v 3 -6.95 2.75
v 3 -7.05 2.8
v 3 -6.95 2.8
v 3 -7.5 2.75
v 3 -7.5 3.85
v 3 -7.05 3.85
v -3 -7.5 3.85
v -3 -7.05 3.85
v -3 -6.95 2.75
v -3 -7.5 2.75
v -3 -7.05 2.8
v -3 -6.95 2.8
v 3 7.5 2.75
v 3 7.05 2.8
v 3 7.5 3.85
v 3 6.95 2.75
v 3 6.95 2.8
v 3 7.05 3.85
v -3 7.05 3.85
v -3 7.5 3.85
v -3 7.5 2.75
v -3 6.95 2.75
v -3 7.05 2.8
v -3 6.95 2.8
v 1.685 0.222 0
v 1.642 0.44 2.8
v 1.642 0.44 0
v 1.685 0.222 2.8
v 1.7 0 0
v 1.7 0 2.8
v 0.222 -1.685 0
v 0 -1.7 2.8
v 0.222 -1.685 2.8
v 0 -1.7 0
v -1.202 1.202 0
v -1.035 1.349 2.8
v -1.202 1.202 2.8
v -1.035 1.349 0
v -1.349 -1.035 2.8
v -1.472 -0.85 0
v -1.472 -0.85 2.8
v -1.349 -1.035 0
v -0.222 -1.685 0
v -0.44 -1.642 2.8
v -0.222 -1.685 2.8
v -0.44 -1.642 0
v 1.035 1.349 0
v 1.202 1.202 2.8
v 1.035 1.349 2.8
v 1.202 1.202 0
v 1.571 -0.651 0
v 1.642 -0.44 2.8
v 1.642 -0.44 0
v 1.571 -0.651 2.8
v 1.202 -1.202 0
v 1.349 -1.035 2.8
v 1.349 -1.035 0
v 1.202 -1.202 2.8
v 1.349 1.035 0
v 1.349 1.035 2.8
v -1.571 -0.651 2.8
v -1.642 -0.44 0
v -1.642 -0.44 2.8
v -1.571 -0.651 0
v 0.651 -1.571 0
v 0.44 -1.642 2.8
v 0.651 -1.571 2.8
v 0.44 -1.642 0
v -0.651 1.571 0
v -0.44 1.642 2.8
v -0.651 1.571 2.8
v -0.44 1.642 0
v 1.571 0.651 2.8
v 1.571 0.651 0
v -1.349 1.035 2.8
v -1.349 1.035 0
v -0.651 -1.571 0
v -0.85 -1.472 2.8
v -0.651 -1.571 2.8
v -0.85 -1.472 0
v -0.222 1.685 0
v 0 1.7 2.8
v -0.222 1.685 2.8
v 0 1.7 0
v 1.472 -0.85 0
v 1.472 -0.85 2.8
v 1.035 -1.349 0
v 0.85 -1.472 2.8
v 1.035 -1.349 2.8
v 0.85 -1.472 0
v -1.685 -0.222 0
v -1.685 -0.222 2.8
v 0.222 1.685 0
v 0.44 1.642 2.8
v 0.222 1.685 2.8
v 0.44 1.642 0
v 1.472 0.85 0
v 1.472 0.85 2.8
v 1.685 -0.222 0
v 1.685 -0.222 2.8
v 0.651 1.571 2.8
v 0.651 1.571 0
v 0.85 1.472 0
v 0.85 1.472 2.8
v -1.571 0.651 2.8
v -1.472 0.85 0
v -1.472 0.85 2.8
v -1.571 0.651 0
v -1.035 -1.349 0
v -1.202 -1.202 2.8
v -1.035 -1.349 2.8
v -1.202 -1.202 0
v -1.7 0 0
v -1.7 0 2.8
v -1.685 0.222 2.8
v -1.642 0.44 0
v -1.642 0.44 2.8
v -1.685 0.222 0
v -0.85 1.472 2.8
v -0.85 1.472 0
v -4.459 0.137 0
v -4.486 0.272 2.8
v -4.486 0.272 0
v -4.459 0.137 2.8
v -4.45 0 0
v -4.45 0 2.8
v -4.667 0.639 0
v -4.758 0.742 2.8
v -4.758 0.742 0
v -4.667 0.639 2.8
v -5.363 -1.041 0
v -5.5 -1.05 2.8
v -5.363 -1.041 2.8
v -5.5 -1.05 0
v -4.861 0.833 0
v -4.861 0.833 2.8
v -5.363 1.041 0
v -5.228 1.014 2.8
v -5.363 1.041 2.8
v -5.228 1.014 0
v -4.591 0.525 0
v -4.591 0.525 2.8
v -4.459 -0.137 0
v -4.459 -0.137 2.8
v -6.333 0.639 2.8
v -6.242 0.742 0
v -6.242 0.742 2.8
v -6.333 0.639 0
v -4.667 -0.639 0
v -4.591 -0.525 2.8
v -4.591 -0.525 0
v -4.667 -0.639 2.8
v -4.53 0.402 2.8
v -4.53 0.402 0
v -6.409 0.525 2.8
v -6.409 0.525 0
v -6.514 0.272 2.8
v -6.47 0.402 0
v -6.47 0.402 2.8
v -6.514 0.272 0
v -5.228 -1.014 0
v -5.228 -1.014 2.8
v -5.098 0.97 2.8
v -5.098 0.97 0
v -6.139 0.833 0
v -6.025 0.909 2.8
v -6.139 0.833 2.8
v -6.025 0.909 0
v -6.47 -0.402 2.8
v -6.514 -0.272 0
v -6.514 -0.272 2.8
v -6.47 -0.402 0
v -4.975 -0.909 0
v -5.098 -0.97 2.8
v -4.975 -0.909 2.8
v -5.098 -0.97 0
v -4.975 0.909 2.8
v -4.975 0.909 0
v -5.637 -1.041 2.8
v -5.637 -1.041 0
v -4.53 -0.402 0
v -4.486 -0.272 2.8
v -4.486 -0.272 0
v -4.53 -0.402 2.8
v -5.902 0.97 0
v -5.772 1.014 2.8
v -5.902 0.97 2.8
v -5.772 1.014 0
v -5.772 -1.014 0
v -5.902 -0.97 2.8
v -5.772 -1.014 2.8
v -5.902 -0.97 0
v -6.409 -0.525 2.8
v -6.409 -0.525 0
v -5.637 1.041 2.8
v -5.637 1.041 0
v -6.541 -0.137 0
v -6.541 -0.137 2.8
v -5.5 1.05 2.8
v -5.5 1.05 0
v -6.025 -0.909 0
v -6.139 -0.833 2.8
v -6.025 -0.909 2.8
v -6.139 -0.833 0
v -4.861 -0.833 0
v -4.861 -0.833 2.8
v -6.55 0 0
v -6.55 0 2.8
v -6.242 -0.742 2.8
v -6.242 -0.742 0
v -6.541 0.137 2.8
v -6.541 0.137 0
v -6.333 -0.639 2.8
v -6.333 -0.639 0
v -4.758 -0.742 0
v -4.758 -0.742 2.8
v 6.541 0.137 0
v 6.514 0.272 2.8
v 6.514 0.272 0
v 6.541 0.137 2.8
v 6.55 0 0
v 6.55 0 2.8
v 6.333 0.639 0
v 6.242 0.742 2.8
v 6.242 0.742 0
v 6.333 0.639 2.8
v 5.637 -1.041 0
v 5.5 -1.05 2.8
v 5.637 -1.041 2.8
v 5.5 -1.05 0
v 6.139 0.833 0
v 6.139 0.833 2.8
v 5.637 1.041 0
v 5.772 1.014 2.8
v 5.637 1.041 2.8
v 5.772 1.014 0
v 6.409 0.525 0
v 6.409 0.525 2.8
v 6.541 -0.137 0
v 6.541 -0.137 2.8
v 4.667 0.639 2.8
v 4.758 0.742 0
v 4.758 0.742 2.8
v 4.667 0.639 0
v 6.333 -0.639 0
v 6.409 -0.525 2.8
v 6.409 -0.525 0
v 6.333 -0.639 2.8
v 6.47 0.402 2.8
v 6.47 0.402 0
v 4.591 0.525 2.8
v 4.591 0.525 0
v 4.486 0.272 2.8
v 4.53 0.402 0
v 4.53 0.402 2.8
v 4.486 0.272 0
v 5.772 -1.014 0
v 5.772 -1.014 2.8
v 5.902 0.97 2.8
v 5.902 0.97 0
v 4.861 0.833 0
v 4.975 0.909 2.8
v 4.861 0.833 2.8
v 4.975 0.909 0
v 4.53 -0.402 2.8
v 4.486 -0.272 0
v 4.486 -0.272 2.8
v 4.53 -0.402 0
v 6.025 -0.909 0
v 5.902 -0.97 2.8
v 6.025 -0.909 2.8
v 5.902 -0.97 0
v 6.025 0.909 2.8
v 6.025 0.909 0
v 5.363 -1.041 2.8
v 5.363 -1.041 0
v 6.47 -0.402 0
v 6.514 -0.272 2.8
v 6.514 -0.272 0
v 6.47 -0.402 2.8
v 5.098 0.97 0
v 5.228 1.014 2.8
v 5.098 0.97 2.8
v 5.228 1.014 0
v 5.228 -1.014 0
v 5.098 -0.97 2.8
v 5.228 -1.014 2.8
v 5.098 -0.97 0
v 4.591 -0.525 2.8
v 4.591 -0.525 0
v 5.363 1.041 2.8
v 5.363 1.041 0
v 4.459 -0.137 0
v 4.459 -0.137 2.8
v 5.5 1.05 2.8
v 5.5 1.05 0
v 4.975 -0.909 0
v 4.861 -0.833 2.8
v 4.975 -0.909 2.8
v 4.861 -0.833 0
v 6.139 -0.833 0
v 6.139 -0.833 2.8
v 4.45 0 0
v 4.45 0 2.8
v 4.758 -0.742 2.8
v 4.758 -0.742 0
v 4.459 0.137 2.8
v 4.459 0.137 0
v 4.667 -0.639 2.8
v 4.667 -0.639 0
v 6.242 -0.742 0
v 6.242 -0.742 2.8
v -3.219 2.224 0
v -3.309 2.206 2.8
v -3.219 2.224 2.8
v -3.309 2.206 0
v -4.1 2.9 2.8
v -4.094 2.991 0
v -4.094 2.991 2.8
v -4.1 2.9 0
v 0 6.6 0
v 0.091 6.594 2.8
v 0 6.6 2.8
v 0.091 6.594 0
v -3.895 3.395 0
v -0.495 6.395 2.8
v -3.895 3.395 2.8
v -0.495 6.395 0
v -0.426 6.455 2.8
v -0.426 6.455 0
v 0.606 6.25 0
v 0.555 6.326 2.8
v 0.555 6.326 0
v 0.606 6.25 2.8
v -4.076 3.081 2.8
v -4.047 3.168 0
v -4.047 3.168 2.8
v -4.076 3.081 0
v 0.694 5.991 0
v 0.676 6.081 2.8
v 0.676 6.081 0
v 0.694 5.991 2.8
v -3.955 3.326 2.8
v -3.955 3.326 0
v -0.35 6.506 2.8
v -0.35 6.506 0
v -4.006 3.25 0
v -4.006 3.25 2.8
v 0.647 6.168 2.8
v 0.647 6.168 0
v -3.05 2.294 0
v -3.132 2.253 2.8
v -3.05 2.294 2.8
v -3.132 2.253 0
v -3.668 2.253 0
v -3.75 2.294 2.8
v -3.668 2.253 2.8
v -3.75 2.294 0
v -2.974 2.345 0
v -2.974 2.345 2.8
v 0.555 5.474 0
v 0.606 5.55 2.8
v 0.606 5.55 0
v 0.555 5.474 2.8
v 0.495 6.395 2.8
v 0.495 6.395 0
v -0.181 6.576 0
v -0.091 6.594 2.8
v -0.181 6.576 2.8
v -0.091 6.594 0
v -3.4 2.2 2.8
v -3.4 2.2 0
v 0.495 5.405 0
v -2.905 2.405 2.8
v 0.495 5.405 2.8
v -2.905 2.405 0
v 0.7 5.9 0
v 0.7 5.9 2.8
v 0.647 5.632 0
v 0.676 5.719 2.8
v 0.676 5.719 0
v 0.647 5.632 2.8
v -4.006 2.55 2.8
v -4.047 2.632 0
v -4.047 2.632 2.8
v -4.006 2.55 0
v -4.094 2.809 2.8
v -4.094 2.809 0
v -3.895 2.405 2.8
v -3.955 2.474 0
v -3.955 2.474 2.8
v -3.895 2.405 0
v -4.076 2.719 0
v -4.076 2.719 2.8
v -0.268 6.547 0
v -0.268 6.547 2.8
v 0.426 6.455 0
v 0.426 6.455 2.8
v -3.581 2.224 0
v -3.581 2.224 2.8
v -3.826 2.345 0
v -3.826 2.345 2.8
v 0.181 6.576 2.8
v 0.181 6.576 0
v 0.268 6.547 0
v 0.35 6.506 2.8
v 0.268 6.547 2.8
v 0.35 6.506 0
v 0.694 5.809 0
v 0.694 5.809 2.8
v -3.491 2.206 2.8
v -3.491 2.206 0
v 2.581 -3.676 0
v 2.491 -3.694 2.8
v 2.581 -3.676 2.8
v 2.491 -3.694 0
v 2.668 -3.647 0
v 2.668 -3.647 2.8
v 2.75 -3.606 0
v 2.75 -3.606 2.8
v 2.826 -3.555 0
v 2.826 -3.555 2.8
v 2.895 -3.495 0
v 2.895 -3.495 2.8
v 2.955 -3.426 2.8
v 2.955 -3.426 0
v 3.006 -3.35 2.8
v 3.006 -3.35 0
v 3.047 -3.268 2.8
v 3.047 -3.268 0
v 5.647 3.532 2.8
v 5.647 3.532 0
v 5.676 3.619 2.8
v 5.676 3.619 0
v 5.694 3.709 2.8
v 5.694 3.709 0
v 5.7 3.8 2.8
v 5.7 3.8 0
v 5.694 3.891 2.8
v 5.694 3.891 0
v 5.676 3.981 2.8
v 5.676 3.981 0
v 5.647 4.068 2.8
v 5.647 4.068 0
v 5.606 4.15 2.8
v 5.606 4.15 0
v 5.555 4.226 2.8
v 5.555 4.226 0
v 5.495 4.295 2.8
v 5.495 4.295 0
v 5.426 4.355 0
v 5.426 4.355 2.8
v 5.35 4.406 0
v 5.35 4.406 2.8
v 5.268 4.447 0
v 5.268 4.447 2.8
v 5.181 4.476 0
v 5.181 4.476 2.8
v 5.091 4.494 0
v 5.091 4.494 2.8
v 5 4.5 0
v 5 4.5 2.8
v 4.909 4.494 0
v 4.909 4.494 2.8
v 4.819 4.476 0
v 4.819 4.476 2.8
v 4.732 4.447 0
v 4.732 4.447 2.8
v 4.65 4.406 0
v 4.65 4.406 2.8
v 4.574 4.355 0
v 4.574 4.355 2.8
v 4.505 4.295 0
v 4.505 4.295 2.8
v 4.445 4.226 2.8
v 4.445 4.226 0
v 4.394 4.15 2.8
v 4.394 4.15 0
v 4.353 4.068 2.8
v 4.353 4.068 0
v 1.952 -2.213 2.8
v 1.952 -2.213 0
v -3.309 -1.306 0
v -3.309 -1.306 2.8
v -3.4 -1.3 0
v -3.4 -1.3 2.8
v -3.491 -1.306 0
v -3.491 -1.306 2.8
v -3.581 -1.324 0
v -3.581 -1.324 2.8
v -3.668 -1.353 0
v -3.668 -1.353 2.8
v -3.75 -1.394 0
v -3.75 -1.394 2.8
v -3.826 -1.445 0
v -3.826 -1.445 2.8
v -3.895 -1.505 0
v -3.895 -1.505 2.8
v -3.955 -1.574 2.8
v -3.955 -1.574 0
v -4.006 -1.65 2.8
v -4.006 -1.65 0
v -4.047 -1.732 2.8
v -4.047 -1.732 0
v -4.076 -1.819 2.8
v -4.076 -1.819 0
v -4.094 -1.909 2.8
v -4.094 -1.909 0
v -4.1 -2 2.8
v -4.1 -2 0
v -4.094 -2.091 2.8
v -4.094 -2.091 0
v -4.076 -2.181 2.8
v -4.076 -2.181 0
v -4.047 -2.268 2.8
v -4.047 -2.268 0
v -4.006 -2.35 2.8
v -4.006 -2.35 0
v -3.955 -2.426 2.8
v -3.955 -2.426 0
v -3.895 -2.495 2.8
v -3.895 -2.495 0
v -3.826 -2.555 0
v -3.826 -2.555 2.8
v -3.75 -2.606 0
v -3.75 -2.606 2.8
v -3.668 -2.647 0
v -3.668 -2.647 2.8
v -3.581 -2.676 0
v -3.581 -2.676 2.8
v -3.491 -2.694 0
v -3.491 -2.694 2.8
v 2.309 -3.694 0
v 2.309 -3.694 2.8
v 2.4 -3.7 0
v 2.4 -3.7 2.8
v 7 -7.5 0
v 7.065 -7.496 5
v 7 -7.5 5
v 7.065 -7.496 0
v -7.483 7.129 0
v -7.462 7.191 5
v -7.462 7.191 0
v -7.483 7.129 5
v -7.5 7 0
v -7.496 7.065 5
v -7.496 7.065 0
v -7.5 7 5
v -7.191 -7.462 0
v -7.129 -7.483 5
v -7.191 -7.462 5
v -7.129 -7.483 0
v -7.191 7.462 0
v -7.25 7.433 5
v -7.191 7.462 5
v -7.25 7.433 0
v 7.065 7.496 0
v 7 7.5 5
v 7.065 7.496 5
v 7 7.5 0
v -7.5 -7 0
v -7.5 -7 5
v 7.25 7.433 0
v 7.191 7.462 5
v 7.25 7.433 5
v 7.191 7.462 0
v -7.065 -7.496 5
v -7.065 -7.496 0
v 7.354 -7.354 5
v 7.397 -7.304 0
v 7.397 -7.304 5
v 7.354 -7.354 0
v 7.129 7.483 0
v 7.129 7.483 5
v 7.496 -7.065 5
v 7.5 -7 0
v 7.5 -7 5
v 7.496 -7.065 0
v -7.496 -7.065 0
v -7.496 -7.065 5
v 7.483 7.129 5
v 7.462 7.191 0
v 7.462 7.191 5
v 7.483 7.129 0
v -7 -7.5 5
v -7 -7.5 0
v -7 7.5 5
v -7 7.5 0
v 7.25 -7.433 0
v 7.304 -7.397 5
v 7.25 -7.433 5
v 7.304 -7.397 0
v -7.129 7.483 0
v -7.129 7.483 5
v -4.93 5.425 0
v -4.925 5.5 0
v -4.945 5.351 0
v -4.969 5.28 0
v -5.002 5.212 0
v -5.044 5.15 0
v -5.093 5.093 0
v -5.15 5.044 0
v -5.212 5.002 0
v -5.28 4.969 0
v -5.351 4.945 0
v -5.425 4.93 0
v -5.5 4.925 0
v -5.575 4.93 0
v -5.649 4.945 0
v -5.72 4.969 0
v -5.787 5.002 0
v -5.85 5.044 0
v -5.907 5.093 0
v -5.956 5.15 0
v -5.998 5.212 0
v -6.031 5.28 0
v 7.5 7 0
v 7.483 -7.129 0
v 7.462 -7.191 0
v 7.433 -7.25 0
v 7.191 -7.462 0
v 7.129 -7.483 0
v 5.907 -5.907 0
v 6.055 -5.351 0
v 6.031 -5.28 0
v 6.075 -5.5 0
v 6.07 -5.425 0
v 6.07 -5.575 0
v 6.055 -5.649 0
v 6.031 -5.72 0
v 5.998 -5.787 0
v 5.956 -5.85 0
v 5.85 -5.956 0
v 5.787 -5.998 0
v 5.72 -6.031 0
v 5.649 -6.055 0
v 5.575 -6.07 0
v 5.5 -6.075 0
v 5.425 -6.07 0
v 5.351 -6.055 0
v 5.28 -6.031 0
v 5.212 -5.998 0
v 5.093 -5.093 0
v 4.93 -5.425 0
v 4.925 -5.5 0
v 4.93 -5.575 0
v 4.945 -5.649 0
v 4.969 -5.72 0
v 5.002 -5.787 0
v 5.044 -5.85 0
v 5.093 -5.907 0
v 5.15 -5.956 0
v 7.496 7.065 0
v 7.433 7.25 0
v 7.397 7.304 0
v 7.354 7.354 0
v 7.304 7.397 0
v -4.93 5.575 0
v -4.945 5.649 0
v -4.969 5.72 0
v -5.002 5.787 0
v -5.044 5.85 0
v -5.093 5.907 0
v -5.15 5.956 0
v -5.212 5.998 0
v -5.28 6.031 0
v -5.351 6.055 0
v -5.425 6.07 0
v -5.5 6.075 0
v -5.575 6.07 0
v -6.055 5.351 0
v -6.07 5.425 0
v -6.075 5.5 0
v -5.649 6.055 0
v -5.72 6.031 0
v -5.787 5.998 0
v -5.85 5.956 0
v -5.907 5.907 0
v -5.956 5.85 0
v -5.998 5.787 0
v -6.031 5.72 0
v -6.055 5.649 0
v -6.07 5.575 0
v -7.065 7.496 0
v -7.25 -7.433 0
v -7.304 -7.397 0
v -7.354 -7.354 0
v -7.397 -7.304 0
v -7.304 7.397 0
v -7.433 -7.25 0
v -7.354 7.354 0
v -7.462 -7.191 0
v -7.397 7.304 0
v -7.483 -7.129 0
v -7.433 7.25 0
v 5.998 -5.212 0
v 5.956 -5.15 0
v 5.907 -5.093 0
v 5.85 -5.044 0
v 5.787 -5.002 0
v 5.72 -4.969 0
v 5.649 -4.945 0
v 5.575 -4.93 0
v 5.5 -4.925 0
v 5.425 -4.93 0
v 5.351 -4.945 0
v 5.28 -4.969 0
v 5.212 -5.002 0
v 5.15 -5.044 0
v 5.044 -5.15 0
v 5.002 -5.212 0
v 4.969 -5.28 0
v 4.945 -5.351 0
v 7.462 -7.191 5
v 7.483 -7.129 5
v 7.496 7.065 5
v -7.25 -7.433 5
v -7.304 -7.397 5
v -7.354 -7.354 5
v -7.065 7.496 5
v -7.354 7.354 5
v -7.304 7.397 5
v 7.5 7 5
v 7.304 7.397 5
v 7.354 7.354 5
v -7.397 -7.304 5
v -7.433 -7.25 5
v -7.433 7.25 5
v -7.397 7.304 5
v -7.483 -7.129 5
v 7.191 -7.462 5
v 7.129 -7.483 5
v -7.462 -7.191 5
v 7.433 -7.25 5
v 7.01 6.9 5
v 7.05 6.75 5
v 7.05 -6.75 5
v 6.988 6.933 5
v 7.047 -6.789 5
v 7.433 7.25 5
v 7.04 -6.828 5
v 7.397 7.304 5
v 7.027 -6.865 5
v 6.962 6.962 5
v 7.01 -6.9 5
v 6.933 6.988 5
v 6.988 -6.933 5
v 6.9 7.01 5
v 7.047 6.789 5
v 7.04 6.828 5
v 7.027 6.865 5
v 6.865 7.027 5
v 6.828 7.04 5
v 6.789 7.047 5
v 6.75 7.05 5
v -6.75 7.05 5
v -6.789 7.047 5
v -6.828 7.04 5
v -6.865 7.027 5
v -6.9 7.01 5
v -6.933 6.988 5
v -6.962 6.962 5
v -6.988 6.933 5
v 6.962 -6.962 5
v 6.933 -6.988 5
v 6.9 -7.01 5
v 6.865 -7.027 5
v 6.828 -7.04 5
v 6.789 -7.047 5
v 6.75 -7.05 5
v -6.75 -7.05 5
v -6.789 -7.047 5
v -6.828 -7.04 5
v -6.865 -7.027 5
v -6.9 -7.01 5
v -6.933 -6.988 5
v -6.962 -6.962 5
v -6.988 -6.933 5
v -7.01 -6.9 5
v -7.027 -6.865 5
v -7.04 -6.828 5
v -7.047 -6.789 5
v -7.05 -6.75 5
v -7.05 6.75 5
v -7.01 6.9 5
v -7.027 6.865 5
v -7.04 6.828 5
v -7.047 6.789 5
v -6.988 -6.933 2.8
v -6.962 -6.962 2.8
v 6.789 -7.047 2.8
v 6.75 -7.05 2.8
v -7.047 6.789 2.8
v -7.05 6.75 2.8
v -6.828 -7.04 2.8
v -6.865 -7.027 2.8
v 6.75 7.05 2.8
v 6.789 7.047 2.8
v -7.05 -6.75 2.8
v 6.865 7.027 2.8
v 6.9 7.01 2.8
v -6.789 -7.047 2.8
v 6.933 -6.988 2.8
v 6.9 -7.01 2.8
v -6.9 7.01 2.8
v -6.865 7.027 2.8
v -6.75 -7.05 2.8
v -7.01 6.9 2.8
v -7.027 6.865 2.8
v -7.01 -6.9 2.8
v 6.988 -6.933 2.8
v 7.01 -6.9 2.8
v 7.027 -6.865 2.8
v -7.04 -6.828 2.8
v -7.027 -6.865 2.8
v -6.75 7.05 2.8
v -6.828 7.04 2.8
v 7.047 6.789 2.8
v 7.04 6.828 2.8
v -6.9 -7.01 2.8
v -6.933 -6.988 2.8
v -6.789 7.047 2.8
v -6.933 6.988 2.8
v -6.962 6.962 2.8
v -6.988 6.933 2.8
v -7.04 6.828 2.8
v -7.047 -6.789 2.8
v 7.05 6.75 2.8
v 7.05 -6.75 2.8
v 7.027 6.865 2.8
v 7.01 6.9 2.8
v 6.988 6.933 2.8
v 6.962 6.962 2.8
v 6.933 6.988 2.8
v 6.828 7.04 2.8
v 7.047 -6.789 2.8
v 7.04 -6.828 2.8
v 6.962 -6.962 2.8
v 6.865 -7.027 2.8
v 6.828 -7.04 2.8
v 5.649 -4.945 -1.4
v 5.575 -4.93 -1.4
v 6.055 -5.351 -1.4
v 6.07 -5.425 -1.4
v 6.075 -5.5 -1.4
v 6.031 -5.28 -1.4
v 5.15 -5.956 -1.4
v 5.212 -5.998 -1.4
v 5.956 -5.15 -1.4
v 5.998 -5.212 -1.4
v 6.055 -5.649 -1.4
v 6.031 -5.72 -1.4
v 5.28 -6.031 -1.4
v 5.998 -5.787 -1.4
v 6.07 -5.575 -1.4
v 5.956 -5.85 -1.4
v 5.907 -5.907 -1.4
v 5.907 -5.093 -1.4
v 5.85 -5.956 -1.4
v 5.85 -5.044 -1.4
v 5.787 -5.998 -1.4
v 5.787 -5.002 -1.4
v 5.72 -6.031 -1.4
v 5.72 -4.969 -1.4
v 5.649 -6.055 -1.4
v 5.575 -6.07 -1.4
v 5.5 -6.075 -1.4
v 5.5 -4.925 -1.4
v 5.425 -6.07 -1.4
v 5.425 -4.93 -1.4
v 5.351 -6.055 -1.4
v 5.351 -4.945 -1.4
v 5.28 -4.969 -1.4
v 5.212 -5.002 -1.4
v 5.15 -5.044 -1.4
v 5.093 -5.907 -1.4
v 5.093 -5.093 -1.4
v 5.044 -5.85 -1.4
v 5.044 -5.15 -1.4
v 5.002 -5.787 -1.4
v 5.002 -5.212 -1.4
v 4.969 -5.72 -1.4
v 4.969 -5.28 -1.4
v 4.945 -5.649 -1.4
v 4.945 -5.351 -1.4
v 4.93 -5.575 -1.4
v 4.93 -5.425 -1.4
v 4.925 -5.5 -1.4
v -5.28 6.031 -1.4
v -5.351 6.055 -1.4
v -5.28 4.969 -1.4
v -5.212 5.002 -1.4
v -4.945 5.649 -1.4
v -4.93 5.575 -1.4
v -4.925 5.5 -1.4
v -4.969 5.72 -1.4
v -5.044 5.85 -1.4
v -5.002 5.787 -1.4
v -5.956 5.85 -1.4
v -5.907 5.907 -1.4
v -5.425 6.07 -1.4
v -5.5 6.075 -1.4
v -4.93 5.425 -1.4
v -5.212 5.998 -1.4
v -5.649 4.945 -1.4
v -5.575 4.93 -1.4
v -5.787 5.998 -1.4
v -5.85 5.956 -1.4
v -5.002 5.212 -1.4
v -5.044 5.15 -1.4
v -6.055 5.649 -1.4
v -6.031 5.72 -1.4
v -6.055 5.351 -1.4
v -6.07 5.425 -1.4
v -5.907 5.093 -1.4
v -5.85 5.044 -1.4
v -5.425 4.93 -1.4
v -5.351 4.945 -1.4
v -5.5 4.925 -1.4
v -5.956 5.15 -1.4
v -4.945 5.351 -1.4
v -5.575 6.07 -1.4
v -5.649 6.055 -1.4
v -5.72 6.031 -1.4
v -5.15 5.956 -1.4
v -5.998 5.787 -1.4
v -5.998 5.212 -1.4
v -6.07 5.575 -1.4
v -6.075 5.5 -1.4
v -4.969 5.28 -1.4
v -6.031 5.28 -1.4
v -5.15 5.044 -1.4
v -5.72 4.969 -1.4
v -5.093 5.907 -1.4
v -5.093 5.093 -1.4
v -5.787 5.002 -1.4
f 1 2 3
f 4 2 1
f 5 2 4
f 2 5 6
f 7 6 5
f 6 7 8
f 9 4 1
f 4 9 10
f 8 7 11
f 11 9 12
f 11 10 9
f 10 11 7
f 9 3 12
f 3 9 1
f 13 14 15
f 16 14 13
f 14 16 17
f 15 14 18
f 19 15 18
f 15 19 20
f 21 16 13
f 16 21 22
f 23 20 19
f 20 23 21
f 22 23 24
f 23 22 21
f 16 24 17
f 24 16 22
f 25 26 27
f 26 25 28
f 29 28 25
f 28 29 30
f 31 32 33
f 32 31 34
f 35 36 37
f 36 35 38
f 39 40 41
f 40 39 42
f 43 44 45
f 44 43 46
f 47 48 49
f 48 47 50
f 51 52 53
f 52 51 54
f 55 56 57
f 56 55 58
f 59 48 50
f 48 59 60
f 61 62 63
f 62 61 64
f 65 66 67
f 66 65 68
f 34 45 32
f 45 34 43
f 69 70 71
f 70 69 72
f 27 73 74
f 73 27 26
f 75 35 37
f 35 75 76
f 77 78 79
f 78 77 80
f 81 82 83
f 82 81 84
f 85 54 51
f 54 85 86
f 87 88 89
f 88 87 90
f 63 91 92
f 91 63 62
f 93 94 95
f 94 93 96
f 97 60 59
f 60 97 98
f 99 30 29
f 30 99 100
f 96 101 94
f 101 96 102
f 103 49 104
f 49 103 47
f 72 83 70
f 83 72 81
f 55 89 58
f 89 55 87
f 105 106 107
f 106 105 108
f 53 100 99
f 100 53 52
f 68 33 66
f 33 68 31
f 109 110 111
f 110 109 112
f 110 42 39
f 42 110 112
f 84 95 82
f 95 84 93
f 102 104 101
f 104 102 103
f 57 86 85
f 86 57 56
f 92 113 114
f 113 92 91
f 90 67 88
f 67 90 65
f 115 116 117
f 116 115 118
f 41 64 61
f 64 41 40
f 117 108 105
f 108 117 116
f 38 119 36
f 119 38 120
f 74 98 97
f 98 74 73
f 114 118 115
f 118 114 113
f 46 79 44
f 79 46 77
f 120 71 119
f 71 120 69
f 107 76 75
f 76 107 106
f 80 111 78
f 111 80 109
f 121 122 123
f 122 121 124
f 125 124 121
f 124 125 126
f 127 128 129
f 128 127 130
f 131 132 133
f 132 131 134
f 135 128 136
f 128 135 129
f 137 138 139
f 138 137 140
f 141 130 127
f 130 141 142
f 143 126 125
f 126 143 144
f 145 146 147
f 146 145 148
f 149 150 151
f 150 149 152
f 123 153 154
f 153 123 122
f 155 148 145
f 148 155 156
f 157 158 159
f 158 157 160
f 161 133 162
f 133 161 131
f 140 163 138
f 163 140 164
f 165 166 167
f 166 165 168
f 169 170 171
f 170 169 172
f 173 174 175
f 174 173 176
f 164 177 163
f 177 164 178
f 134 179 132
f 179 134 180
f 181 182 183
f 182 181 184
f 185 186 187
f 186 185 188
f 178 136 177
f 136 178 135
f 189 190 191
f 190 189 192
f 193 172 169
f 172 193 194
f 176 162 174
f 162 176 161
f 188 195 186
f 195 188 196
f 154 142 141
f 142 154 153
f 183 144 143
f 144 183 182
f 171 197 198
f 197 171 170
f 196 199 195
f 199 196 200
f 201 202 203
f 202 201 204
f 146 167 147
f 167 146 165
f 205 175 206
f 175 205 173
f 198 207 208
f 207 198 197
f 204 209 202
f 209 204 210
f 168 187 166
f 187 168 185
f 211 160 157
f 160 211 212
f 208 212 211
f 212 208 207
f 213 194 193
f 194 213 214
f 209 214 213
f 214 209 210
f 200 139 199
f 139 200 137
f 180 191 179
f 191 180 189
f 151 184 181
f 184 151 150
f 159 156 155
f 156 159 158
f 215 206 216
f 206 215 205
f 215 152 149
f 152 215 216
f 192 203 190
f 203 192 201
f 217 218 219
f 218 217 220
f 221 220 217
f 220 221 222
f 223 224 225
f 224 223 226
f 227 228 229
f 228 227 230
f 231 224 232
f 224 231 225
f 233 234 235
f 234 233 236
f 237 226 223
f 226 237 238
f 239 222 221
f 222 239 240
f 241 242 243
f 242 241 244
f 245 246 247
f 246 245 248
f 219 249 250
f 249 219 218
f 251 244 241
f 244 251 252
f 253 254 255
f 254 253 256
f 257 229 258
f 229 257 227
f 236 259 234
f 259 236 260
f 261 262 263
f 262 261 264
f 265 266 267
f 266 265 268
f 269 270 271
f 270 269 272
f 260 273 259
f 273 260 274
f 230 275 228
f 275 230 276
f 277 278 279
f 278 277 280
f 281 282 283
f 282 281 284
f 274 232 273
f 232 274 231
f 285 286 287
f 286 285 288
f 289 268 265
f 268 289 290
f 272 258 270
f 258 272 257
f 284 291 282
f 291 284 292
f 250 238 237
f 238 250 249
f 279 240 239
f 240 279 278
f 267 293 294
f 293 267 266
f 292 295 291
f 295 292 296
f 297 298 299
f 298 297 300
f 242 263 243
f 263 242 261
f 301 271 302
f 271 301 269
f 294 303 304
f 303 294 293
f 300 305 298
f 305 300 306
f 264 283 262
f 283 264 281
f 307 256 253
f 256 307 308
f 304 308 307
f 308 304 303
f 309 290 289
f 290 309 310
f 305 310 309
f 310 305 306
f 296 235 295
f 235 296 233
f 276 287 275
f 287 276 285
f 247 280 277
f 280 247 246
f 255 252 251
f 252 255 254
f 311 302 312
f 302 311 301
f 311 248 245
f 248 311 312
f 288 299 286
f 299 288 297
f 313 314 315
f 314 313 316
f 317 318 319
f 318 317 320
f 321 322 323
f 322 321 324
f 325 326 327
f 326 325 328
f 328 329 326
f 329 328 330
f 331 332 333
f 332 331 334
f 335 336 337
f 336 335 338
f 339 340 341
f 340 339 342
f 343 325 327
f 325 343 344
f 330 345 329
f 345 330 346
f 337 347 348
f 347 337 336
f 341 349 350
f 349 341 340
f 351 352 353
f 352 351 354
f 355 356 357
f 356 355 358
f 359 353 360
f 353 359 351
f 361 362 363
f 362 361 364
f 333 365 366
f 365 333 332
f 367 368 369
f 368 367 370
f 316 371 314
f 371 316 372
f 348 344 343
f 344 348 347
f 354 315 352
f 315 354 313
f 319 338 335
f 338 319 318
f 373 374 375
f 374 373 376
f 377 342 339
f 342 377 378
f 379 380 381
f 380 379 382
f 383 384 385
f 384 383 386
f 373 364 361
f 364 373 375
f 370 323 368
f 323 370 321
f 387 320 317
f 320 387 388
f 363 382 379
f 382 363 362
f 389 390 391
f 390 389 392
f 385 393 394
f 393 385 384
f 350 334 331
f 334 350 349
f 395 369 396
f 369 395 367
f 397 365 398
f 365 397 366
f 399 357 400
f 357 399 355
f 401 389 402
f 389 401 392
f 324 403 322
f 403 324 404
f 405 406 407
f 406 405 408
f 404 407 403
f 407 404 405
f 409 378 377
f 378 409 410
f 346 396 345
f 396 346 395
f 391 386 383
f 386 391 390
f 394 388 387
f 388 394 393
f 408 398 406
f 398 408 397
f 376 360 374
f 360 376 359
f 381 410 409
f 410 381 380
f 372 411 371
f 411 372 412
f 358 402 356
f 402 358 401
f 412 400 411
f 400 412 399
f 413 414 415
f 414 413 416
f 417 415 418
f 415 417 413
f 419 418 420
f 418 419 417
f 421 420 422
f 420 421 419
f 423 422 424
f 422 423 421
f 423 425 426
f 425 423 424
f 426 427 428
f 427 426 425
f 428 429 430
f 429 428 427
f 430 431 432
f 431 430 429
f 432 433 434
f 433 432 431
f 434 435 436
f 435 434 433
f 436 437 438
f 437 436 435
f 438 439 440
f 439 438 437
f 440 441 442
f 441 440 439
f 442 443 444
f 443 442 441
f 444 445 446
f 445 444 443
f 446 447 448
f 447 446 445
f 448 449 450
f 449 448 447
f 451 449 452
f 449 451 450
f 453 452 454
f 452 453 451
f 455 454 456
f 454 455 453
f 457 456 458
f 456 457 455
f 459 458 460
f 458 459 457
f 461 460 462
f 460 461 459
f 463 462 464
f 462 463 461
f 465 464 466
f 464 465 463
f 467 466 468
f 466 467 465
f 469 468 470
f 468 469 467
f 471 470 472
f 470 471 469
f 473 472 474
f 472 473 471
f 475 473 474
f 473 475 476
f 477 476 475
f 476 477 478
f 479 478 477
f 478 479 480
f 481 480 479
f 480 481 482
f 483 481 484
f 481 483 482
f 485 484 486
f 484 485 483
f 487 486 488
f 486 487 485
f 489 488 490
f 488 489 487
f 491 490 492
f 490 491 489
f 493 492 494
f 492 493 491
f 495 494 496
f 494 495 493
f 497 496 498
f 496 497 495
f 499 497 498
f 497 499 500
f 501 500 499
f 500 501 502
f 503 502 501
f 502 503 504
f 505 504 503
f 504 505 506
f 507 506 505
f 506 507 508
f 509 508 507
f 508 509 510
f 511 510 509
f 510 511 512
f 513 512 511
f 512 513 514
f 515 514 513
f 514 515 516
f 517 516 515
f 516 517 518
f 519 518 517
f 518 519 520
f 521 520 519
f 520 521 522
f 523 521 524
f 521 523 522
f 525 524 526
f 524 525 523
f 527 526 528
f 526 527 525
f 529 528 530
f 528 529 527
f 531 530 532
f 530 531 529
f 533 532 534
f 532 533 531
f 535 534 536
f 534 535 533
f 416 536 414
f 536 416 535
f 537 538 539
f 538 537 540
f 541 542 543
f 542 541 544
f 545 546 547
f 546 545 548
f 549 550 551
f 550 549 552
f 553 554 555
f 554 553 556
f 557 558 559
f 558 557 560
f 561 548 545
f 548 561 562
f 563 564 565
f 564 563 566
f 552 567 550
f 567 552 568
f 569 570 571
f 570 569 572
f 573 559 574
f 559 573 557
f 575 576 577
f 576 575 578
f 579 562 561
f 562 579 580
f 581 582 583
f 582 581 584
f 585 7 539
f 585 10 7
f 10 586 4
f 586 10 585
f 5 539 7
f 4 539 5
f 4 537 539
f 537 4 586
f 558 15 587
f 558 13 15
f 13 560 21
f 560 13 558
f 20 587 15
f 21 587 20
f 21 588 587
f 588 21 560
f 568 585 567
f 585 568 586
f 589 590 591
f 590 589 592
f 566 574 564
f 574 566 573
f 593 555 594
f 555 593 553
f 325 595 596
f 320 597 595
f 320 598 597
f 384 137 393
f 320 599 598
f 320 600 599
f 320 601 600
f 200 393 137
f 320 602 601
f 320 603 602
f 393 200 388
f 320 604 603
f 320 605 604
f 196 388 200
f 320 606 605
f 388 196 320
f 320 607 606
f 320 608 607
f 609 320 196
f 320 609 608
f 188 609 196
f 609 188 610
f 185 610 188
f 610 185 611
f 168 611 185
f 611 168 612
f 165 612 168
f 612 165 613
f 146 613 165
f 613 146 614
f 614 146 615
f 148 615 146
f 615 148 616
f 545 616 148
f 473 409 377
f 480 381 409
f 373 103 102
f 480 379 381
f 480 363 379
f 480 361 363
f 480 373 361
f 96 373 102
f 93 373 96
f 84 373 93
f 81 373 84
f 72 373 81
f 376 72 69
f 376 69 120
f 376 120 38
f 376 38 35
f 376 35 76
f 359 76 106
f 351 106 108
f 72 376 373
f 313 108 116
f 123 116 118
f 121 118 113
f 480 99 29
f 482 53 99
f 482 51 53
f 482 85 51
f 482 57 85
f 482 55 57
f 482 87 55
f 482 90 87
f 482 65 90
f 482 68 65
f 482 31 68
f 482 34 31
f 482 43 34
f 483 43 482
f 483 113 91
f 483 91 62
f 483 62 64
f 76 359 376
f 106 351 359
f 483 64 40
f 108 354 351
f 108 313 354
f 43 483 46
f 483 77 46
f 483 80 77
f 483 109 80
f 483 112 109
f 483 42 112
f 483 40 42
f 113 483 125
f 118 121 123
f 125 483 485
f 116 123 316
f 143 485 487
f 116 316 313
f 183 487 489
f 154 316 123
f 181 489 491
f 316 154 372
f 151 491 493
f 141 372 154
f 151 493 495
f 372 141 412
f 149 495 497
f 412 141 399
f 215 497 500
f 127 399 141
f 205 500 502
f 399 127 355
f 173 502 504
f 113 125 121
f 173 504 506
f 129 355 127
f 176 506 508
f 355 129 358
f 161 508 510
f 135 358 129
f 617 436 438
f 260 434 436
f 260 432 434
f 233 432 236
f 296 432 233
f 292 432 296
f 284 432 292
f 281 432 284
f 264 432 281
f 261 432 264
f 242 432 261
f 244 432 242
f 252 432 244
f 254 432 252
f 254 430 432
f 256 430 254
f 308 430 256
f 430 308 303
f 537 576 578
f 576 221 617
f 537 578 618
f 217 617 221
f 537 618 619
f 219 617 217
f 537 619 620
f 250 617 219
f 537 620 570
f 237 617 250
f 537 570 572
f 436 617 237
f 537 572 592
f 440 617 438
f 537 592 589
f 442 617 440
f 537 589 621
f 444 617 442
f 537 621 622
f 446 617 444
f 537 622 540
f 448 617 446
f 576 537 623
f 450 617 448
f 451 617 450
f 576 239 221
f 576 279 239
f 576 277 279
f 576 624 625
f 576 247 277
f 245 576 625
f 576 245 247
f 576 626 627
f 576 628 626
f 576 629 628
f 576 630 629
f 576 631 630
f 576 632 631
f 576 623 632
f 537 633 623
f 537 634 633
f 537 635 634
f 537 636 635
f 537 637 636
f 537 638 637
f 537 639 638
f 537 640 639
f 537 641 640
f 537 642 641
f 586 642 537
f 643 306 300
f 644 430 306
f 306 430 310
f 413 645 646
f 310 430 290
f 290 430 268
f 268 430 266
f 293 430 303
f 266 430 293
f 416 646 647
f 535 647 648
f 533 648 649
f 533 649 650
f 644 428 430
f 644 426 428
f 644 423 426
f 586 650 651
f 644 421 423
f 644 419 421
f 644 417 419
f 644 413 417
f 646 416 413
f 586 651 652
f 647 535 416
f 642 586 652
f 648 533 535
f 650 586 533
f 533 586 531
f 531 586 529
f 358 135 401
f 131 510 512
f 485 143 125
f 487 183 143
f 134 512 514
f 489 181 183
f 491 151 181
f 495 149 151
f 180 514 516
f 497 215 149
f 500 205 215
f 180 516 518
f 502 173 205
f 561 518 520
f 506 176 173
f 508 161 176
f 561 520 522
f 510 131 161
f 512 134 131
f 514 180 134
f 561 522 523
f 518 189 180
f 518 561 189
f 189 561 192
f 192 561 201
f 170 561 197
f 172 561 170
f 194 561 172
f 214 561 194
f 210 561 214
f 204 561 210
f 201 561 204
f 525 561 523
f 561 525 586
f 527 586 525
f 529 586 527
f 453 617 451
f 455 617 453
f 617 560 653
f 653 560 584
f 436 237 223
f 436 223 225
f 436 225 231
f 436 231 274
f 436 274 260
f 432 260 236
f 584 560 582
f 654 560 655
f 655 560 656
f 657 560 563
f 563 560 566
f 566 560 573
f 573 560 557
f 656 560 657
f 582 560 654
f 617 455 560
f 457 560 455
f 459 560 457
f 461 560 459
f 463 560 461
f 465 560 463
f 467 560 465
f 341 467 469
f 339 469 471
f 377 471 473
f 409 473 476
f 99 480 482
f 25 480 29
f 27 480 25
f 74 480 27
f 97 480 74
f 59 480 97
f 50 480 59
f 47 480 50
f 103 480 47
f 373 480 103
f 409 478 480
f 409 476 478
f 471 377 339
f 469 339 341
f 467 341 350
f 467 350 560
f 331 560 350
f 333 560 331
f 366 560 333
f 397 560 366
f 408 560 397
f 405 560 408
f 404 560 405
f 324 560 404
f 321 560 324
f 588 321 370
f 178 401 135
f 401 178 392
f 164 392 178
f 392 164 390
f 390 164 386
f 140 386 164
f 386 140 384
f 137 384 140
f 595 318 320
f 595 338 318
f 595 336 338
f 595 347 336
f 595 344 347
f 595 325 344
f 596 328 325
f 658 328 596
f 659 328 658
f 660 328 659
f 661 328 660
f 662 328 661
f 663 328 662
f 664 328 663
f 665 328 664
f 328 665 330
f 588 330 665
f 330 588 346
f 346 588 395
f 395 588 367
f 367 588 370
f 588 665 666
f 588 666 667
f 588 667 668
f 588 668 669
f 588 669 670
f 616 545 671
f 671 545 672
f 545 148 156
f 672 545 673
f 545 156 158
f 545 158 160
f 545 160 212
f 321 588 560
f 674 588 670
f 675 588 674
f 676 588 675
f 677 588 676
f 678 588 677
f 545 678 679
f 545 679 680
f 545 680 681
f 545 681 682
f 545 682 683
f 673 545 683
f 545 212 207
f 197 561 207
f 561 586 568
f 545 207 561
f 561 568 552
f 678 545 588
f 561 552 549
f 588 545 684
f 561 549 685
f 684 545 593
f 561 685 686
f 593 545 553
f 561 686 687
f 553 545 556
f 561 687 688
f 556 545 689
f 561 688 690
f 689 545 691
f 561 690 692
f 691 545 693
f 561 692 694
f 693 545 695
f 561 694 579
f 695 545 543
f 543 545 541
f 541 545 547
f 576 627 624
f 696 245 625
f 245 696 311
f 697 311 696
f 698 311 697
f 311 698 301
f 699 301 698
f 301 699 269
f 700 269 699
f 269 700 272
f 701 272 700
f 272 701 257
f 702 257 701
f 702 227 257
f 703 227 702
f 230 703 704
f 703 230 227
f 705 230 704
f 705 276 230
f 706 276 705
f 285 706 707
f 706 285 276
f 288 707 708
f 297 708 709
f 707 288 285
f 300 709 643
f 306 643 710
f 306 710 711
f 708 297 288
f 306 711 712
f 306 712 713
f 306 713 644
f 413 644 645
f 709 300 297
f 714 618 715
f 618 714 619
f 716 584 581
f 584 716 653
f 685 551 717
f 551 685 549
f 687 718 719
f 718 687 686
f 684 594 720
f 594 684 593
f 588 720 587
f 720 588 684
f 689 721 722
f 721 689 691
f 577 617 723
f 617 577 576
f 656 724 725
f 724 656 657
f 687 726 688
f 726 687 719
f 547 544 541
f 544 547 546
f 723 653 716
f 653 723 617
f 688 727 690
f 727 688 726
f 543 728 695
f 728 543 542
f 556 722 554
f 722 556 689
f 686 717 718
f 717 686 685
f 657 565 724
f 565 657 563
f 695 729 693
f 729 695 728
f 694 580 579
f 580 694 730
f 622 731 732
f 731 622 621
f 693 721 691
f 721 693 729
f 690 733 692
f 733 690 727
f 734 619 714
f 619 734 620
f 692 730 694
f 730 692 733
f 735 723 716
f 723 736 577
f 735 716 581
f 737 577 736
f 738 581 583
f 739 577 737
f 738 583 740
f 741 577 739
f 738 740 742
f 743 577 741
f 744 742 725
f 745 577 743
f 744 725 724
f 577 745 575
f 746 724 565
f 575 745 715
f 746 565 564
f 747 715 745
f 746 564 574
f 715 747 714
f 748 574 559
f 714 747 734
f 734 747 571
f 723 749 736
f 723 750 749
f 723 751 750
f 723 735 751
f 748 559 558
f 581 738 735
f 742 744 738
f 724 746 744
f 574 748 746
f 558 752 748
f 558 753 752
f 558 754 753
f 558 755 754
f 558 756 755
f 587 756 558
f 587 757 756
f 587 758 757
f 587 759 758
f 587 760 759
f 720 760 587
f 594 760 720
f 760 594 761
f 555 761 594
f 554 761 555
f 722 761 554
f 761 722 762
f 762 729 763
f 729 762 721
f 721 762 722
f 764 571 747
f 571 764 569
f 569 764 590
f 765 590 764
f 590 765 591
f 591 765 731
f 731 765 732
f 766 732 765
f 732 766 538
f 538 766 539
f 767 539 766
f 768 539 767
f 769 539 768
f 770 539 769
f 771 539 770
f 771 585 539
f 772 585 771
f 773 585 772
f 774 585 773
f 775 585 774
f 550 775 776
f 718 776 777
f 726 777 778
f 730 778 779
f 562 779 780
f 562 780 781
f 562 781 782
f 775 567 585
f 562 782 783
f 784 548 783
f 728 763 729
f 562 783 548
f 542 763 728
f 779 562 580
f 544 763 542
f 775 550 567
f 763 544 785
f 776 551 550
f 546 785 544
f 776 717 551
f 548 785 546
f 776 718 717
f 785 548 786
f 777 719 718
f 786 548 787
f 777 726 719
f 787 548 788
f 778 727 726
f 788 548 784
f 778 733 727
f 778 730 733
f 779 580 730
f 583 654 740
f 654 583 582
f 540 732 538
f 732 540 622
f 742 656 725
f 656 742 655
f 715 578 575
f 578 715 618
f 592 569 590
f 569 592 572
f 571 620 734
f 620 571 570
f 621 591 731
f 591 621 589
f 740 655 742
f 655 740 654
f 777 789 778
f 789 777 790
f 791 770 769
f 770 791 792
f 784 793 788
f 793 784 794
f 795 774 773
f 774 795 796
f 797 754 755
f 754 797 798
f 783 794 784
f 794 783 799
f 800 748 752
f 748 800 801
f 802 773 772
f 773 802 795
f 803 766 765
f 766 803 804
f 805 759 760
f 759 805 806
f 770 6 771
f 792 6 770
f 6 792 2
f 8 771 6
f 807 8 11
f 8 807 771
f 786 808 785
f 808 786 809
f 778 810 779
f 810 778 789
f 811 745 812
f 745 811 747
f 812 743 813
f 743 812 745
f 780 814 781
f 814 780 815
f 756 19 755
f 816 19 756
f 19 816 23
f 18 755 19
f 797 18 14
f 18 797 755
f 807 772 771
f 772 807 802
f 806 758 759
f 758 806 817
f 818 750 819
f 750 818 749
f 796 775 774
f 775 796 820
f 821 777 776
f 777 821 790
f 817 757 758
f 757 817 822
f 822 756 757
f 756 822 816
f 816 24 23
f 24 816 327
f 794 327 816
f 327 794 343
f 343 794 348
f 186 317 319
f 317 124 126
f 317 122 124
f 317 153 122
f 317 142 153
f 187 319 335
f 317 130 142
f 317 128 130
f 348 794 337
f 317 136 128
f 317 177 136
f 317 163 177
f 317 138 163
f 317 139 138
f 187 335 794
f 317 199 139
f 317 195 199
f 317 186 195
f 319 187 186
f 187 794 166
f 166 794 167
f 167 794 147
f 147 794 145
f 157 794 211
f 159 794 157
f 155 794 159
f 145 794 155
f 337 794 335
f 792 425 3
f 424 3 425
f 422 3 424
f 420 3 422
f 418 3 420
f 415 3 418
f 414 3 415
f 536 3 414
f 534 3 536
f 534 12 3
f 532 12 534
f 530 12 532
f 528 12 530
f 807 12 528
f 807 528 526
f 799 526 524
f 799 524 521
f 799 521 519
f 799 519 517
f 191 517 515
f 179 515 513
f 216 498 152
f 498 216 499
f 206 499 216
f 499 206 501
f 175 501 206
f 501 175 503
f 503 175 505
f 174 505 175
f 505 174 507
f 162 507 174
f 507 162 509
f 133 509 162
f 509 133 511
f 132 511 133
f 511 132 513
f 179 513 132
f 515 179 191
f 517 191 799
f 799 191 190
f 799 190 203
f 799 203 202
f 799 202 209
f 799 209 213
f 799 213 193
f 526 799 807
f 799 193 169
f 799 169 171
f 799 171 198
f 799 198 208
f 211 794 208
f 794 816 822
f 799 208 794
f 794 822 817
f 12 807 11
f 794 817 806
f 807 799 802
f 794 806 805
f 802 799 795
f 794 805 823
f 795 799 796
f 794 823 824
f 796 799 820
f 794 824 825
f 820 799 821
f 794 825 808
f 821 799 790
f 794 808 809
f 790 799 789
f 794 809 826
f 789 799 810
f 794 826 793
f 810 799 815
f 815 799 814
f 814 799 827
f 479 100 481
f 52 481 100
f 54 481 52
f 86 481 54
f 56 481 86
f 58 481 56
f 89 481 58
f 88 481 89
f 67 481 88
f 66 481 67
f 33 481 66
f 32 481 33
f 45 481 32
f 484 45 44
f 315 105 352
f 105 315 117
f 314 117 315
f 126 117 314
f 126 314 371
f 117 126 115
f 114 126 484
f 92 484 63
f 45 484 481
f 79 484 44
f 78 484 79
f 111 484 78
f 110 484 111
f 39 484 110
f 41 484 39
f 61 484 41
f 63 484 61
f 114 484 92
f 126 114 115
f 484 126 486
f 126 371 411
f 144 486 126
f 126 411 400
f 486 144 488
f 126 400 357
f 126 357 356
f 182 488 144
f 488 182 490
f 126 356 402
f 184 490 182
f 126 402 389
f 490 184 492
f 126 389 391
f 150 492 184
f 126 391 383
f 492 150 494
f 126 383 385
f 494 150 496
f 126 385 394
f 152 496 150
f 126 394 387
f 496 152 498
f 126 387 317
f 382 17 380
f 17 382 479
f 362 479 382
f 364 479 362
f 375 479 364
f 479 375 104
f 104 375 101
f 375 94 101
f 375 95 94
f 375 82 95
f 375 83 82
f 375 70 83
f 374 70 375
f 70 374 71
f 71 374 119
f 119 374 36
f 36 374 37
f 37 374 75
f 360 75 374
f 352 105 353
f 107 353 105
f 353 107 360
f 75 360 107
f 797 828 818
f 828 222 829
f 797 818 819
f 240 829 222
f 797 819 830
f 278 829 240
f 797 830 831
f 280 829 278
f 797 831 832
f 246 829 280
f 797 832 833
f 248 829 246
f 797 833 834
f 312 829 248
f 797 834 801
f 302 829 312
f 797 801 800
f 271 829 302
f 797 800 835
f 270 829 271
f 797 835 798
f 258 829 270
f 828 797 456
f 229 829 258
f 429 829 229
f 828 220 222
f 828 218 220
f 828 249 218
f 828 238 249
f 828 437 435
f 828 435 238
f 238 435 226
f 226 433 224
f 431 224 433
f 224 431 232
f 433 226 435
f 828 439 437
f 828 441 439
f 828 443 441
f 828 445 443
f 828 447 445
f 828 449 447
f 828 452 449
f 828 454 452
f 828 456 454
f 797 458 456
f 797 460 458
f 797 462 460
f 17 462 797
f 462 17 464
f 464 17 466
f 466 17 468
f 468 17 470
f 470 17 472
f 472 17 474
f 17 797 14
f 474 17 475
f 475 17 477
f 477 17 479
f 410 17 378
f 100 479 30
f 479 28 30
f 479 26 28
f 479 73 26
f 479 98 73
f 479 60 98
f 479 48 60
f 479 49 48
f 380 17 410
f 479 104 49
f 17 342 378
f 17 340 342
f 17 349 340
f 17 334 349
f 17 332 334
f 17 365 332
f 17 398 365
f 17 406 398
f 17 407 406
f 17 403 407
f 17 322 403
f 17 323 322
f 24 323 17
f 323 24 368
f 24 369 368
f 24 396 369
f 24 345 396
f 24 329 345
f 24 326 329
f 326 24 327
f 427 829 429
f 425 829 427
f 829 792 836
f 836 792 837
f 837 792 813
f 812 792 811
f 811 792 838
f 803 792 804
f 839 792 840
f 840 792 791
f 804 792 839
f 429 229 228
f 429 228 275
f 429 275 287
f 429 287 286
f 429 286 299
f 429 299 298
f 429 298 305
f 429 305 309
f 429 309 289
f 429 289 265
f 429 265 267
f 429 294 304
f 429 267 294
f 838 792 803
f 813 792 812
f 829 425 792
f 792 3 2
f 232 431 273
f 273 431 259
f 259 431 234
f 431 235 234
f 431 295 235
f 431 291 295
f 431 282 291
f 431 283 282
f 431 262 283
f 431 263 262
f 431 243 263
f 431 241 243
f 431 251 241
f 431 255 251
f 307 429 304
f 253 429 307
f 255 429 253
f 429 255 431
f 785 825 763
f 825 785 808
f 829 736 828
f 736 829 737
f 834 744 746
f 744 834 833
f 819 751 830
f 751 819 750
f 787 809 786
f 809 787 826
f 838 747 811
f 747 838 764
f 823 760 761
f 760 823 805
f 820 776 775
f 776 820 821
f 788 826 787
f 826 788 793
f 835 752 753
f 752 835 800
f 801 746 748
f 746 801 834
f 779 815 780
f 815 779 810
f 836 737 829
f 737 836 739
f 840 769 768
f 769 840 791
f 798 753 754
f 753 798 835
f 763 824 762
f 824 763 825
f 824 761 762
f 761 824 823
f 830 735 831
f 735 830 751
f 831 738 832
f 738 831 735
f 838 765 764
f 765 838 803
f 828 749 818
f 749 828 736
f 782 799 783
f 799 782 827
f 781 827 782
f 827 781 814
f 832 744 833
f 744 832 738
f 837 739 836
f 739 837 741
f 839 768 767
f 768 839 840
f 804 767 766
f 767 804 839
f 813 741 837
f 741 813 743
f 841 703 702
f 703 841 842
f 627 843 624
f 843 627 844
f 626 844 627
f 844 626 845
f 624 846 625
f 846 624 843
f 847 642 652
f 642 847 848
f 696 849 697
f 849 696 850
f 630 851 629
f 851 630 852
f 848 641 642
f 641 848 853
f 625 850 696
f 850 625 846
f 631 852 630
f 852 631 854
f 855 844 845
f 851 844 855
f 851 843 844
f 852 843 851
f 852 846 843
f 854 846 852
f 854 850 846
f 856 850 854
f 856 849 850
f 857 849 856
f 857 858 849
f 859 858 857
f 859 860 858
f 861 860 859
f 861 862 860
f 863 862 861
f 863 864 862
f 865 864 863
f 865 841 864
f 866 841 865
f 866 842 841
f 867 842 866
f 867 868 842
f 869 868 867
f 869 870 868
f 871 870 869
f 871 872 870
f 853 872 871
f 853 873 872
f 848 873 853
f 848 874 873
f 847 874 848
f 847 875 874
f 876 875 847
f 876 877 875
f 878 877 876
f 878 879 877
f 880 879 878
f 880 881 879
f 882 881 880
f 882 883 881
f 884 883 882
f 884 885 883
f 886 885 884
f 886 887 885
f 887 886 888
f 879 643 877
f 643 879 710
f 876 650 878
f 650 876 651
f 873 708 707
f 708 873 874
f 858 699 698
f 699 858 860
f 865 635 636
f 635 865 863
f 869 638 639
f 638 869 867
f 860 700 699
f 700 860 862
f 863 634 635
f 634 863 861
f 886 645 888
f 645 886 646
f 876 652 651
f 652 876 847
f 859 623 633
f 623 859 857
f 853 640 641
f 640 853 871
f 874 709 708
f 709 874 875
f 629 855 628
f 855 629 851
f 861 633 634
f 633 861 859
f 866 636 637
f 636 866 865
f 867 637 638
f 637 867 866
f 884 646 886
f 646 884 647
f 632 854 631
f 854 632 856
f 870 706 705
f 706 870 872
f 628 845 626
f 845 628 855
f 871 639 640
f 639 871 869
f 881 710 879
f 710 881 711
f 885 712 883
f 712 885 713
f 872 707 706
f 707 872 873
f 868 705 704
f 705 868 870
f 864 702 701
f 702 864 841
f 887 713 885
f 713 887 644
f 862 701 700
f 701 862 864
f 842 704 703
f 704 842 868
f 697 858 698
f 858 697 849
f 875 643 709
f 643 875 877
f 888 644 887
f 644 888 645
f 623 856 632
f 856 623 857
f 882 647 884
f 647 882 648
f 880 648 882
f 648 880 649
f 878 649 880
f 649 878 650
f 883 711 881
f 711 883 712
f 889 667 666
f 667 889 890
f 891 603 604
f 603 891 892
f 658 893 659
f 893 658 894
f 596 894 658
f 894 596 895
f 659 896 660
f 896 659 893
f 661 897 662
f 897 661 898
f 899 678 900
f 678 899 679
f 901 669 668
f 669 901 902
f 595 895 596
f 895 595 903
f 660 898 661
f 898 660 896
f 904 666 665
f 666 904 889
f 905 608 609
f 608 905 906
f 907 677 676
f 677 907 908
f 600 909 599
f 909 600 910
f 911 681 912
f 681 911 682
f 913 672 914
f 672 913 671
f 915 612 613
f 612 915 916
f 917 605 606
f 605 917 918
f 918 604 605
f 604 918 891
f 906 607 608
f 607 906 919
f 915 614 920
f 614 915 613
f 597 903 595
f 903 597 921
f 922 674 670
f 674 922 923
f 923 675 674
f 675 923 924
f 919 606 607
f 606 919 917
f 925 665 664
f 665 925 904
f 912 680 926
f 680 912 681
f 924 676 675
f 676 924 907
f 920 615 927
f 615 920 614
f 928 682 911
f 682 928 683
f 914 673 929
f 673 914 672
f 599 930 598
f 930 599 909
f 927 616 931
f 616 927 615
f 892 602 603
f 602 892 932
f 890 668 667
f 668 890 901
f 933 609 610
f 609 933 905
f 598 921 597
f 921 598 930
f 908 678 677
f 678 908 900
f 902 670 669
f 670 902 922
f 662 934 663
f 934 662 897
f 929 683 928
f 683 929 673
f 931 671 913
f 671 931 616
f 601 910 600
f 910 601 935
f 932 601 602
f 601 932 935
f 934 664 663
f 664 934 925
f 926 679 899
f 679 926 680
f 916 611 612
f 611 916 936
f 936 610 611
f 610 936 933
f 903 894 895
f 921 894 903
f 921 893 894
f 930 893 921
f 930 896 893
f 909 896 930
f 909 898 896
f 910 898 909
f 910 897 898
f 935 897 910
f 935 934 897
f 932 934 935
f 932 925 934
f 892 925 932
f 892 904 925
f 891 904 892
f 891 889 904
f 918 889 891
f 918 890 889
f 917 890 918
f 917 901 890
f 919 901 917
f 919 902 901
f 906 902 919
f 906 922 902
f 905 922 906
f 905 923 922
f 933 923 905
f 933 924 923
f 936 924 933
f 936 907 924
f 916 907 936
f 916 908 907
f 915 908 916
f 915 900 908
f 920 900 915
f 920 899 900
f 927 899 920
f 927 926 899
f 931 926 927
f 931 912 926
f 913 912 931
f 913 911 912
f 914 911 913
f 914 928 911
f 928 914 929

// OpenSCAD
// ============================================================================
// PG1350 -> PG1425 Switch Adapter (Rectangular Block Design, v3)
//
// CONCEPT:
//   A rectangular block, like a tiny "adapter PCB" with a bezel:
//     * TOP SIDE : recessed POCKET that the PG1350 (Kailh Choc) bottom
//                  housing drops INTO. Pocket floor has the TRUE Choc
//                  footprint: center post, 2 plastic locating posts,
//                  and 2 electrical pins.
//     * BOTTOM SIDE: - SQUARE center alignment post fitting the PG1425
//                      PCB's square center hole (primary alignment)
//                    - round pin posts matching the PG1425 PCB hole pattern
//                    - two routing channels for the dual-ended stamped
//                      contacts (Choc pin exits -> PG1425 pad positions)
//
// Z REFERENCE: z = 0 is the BOTTOM face of the block (sits on PG1425 PCB).
//   Posts extend below z = 0 into the PCB holes.
//
// KAILH CHOC PG1350 TRUE BOTTOM LAYOUT (viewed from above, switch north up):
//     center post  phi 3.2  at ( 0.0,  0.0 )
//     locating post phi 1.9 at (-5.5,  0.0 ) and ( 5.5, 0.0 )
//     electrical pin phi~1.0 at ( 0.0,  5.9 ) and ( 5.0, 3.8 )
//     bottom housing 13.8 x 13.8, height 2.2 below the 15x15 flange
// ============================================================================

// ---------------------------------------------------------------------------
// PRINT / TOLERANCE SETTINGS
// ---------------------------------------------------------------------------
$fn = 48;                      // Curve smoothness

pocket_clearance = 0.30;       // mm - added to pocket size (Choc body drop-in fit)
hole_clearance   = 0.20;       // mm - added to hole diameters (switch post/pin fit)
post_clearance   = 0.15;       // mm - subtracted from post sizes (PCB hole fit)
eps              = 0.10;       // mm - overlap fudge for clean booleans

// ---------------------------------------------------------------------------
// PG1350 (Kailh Choc) TRUE DIMENSIONS - TOP-SIDE INTERFACE
// ---------------------------------------------------------------------------
choc_body_xy         = 13.80;  // mm - Choc bottom-housing footprint (square)
choc_body_h          = 2.20;   // mm - bottom housing height below the flange
choc_flange_xy       = 15.00;  // mm - top lip / flange size (datasheet: 15.00)

choc_center_post_d   = 3.20;   // mm - center post diameter,  at (0, 0)
choc_center_post_len = 2.65;   // mm - center post length below housing

choc_side_post_d     = 1.90;   // mm - plastic locating post diameter (x2)
choc_side_post_x     = 5.50;   // mm - locating posts at (+/-5.5, 0)
choc_side_post_len   = 2.65;   // mm - locating post length below housing

choc_pin_d           = 1.20;   // mm - electrical pin hole diameter (PCB drill)
choc_pin_len         = 2.65;   // mm - pin length below housing
choc_pin1_pos        = [ 0.0, 5.9 ];  // mm - pin 1 position (switch center = origin)
choc_pin2_pos        = [ 5.0, 3.8 ];  // mm - pin 2 position

// ---------------------------------------------------------------------------
// PG1425 BOTTOM-SIDE INTERFACE  (block bottom fits the PG1425 PCB footprint)
// ---------------------------------------------------------------------------
// FROM VERIFIED KICAD FOOTPRINT (shikamiya/kicad-footprint-kailh-pg1425-x-switch,
// saved locally as Kailh-PG1425-X-Switch.kicad_mod). Coordinates below are
// relative to the switch center, OpenSCAD convention (Y up):
//   - 2 NON-PLATED alignment holes phi 1.30 at ( 5.5, -5.5) and (-5.5,  5.5)
//     -> the switch's non-metallic alignment pins; we print matching posts
//   - 2 PLATED pin holes drill phi 1.10 at (-3.4,  2.9) [pin1] and (-3.4, -2.0) [pin2]
//   - large center cutout ~5.1 x 4.1 mm at (0, -0.9) (open hole in the PCB)
pg1425_align_hole_d     = 1.30;   // mm - non-plated alignment hole diameter
pg1425_align_positions  = [ [ 5.5, -5.5], [-5.5,  5.5] ];
pg1425_align_pin_h      = 1.40;   // mm - printed alignment pin length (< PCB thickness)

pg1425_pin1_pos         = [-3.4,  2.9];   // mm - plated pin hole 1 (drill 1.10)
pg1425_pin2_pos         = [-3.4, -2.0];   // mm - plated pin hole 2 (drill 1.10)

// Center cutout in the PCB (informational - it is an open hole, the adapter
// bottom face simply spans it; no boss needed since alignment pins locate us)
pg1425_cutout_size      = [ 5.1, 4.1 ];   // mm
pg1425_cutout_pos       = [ 0, -0.9 ];    // mm

// ---------------------------------------------------------------------------
// ADAPTER BODY
// The outer body matches the Choc 15.00 flange exactly, so the switch's
// top lip lands flush on the bezel walls - no wasted width or depth.
// Bezel wall thickness is DERIVED: (15.00 - 13.80 - clearance)/2 ~ 0.45mm.
// ---------------------------------------------------------------------------
body_x = choc_flange_xy;       // mm - outer width  = flange size (15.00)
body_y = choc_flange_xy;       // mm - outer depth  = flange size (15.00)

wall_t = (choc_flange_xy - choc_body_xy - pocket_clearance) / 2;  // ~0.45mm
wall_h           = choc_body_h;// mm - pocket depth: full Choc bottom-housing
                               //      height (2.20), so the flange rests on
                               //      the top of the bezel walls

// Floor thickness = MINIMUM possible: just deeper than the Choc's 2.65mm
// posts/pins so they don't touch the PCB and lift the adapter. Post holes
// go all the way THROUGH (no membrane) - the PCB surface below the post
// positions is solid, so nothing conflicts. Total added height vs a normal
// Choc install = floor_h = 2.80mm.
floor_h = choc_center_post_len + 0.15;   // 2.80mm

body_h = floor_h + wall_h;                             // total block height

corner_radius    = 0.5;        // mm - rounded body corners (0 = square)

// ---------------------------------------------------------------------------
// PLATE-CLIP WINDOWS
// The Choc's retention clips (north + south faces) are designed to snap
// under a 1.2mm plate. Cutting windows through the bezel walls, starting
// plate_t below the wall top, makes the top 1.2mm of wall act exactly like
// a standard Choc plate - the clips snap into the windows and retain the
// switch on the adapter.
// ---------------------------------------------------------------------------
plate_t          = 1.20;       // mm - effective "plate" thickness above window
clip_window_w    = 6.0;        // mm - window width (Choc clips ~5mm, + margin)

// ---------------------------------------------------------------------------
// PIN ROUTING THROUGH-SLOTS
// Each slot is a polyline cut all the way THROUGH the floor, connecting a
// Choc pin entry (top) to its PG1425 pin-hole position (bottom). A bent
// Choc pin, wire, or stamped contact routes through the slot and exits
// straight down into the PCB pin hole. Slots are flush with the bottom
// face - only the two alignment pins protrude.
// ---------------------------------------------------------------------------
slot_w           = 1.4;        // mm - routing slot width

// Slot polylines: first point = Choc pin entry, last = PG1425 pin hole.
// Slot 2 detours below center to clear the Choc center-post pocket and
// the side-post pocket at (5.5, 0).
slots = [
    [ choc_pin1_pos, pg1425_pin1_pos ],                    // (0,5.9) -> (-3.4, 2.9)
    [ choc_pin2_pos, [2.4, -3.0], pg1425_pin2_pos ],       // (5,3.8) -> (-3.4,-2.0)
];

// ============================================================================
// MODULES
// ============================================================================

// Rounded-corner rectangular block, centered on XY origin, base at z = 0
module rounded_block(x, y, h, r) {
    if (r > 0) {
        linear_extrude(height = h)
            offset(r = r) offset(delta = -r)
                square([x, y], center = true);
    } else {
        translate([0, 0, h/2]) cube([x, y, h], center = true);
    }
}

// Main solid body (bezel walls + floor)
module body() {
    rounded_block(body_x, body_y, body_h, corner_radius);
}

// Top pocket that the Choc bottom housing drops into
module choc_pocket() {
    pocket_xy = choc_body_xy + pocket_clearance;
    translate([0, 0, floor_h])
        rounded_block(pocket_xy, pocket_xy, wall_h + eps, 0.3);
}

// Clip windows cut through the north and south bezel walls. Window spans
// from the pocket floor up to (wall top - plate_t), leaving a 1.2mm
// "plate lip" for the Choc clips to snap under.
module clip_windows() {
    window_h = wall_h - plate_t + eps;   // from floor_h up
    for (sy = [-1, 1])
        translate([0, sy * (body_y/2 - wall_t/2), floor_h + window_h/2 - eps/2])
            cube([clip_window_w, wall_t + 2*eps, window_h], center = true);
}

// Through-hole cut through the full floor (for Choc posts)
module through_hole(pos, d) {
    translate([pos[0], pos[1], -eps])
        cylinder(h = floor_h + 2*eps, d = d + hole_clearance);
}

// PG1350 receiving holes, cut THROUGH the floor - TRUE Choc layout.
// Posts end 0.15mm above the PCB surface (floor is post length + 0.15).
module pg1350_holes() {
    // Center post (phi 3.2) at (0, 0)
    through_hole([0, 0], choc_center_post_d);

    // Two plastic locating posts (phi 1.9 at +/-5.5, 0)
    through_hole([-choc_side_post_x, 0], choc_side_post_d);
    through_hole([ choc_side_post_x, 0], choc_side_post_d);
}

// One routing through-slot: rounded polyline slot cut through the floor
// (z = 0 .. floor_h), built as chained hulls over consecutive points
module routing_slot(pts) {
    translate([0, 0, -eps])
        linear_extrude(height = floor_h + 2*eps)
            for (i = [0 : len(pts) - 2])
                hull() {
                    translate(pts[i])     circle(d = slot_w);
                    translate(pts[i + 1]) circle(d = slot_w);
                }
}

// All pin routing through-slots
module pin_routing_slots() {
    for (s = slots) routing_slot(s);
}

// Two printed alignment pins that drop into the PG1425 PCB's non-plated
// phi 1.30 holes. These are the ONLY bottom protrusions.
module pg1425_alignment_pins() {
    for (p = pg1425_align_positions)
        translate([p[0], p[1], -pg1425_align_pin_h])
            cylinder(h = pg1425_align_pin_h + eps,
                     d = pg1425_align_hole_d - post_clearance);
}

// ============================================================================
// ASSEMBLY
// ============================================================================
module adapter() {
    union() {
        difference() {
            body();
            choc_pocket();
            clip_windows();
            pg1350_holes();
            pin_routing_slots();
        }
        pg1425_alignment_pins();
    }
}

adapter();

// ============================================================================
// END OF FILE
// ============================================================================
